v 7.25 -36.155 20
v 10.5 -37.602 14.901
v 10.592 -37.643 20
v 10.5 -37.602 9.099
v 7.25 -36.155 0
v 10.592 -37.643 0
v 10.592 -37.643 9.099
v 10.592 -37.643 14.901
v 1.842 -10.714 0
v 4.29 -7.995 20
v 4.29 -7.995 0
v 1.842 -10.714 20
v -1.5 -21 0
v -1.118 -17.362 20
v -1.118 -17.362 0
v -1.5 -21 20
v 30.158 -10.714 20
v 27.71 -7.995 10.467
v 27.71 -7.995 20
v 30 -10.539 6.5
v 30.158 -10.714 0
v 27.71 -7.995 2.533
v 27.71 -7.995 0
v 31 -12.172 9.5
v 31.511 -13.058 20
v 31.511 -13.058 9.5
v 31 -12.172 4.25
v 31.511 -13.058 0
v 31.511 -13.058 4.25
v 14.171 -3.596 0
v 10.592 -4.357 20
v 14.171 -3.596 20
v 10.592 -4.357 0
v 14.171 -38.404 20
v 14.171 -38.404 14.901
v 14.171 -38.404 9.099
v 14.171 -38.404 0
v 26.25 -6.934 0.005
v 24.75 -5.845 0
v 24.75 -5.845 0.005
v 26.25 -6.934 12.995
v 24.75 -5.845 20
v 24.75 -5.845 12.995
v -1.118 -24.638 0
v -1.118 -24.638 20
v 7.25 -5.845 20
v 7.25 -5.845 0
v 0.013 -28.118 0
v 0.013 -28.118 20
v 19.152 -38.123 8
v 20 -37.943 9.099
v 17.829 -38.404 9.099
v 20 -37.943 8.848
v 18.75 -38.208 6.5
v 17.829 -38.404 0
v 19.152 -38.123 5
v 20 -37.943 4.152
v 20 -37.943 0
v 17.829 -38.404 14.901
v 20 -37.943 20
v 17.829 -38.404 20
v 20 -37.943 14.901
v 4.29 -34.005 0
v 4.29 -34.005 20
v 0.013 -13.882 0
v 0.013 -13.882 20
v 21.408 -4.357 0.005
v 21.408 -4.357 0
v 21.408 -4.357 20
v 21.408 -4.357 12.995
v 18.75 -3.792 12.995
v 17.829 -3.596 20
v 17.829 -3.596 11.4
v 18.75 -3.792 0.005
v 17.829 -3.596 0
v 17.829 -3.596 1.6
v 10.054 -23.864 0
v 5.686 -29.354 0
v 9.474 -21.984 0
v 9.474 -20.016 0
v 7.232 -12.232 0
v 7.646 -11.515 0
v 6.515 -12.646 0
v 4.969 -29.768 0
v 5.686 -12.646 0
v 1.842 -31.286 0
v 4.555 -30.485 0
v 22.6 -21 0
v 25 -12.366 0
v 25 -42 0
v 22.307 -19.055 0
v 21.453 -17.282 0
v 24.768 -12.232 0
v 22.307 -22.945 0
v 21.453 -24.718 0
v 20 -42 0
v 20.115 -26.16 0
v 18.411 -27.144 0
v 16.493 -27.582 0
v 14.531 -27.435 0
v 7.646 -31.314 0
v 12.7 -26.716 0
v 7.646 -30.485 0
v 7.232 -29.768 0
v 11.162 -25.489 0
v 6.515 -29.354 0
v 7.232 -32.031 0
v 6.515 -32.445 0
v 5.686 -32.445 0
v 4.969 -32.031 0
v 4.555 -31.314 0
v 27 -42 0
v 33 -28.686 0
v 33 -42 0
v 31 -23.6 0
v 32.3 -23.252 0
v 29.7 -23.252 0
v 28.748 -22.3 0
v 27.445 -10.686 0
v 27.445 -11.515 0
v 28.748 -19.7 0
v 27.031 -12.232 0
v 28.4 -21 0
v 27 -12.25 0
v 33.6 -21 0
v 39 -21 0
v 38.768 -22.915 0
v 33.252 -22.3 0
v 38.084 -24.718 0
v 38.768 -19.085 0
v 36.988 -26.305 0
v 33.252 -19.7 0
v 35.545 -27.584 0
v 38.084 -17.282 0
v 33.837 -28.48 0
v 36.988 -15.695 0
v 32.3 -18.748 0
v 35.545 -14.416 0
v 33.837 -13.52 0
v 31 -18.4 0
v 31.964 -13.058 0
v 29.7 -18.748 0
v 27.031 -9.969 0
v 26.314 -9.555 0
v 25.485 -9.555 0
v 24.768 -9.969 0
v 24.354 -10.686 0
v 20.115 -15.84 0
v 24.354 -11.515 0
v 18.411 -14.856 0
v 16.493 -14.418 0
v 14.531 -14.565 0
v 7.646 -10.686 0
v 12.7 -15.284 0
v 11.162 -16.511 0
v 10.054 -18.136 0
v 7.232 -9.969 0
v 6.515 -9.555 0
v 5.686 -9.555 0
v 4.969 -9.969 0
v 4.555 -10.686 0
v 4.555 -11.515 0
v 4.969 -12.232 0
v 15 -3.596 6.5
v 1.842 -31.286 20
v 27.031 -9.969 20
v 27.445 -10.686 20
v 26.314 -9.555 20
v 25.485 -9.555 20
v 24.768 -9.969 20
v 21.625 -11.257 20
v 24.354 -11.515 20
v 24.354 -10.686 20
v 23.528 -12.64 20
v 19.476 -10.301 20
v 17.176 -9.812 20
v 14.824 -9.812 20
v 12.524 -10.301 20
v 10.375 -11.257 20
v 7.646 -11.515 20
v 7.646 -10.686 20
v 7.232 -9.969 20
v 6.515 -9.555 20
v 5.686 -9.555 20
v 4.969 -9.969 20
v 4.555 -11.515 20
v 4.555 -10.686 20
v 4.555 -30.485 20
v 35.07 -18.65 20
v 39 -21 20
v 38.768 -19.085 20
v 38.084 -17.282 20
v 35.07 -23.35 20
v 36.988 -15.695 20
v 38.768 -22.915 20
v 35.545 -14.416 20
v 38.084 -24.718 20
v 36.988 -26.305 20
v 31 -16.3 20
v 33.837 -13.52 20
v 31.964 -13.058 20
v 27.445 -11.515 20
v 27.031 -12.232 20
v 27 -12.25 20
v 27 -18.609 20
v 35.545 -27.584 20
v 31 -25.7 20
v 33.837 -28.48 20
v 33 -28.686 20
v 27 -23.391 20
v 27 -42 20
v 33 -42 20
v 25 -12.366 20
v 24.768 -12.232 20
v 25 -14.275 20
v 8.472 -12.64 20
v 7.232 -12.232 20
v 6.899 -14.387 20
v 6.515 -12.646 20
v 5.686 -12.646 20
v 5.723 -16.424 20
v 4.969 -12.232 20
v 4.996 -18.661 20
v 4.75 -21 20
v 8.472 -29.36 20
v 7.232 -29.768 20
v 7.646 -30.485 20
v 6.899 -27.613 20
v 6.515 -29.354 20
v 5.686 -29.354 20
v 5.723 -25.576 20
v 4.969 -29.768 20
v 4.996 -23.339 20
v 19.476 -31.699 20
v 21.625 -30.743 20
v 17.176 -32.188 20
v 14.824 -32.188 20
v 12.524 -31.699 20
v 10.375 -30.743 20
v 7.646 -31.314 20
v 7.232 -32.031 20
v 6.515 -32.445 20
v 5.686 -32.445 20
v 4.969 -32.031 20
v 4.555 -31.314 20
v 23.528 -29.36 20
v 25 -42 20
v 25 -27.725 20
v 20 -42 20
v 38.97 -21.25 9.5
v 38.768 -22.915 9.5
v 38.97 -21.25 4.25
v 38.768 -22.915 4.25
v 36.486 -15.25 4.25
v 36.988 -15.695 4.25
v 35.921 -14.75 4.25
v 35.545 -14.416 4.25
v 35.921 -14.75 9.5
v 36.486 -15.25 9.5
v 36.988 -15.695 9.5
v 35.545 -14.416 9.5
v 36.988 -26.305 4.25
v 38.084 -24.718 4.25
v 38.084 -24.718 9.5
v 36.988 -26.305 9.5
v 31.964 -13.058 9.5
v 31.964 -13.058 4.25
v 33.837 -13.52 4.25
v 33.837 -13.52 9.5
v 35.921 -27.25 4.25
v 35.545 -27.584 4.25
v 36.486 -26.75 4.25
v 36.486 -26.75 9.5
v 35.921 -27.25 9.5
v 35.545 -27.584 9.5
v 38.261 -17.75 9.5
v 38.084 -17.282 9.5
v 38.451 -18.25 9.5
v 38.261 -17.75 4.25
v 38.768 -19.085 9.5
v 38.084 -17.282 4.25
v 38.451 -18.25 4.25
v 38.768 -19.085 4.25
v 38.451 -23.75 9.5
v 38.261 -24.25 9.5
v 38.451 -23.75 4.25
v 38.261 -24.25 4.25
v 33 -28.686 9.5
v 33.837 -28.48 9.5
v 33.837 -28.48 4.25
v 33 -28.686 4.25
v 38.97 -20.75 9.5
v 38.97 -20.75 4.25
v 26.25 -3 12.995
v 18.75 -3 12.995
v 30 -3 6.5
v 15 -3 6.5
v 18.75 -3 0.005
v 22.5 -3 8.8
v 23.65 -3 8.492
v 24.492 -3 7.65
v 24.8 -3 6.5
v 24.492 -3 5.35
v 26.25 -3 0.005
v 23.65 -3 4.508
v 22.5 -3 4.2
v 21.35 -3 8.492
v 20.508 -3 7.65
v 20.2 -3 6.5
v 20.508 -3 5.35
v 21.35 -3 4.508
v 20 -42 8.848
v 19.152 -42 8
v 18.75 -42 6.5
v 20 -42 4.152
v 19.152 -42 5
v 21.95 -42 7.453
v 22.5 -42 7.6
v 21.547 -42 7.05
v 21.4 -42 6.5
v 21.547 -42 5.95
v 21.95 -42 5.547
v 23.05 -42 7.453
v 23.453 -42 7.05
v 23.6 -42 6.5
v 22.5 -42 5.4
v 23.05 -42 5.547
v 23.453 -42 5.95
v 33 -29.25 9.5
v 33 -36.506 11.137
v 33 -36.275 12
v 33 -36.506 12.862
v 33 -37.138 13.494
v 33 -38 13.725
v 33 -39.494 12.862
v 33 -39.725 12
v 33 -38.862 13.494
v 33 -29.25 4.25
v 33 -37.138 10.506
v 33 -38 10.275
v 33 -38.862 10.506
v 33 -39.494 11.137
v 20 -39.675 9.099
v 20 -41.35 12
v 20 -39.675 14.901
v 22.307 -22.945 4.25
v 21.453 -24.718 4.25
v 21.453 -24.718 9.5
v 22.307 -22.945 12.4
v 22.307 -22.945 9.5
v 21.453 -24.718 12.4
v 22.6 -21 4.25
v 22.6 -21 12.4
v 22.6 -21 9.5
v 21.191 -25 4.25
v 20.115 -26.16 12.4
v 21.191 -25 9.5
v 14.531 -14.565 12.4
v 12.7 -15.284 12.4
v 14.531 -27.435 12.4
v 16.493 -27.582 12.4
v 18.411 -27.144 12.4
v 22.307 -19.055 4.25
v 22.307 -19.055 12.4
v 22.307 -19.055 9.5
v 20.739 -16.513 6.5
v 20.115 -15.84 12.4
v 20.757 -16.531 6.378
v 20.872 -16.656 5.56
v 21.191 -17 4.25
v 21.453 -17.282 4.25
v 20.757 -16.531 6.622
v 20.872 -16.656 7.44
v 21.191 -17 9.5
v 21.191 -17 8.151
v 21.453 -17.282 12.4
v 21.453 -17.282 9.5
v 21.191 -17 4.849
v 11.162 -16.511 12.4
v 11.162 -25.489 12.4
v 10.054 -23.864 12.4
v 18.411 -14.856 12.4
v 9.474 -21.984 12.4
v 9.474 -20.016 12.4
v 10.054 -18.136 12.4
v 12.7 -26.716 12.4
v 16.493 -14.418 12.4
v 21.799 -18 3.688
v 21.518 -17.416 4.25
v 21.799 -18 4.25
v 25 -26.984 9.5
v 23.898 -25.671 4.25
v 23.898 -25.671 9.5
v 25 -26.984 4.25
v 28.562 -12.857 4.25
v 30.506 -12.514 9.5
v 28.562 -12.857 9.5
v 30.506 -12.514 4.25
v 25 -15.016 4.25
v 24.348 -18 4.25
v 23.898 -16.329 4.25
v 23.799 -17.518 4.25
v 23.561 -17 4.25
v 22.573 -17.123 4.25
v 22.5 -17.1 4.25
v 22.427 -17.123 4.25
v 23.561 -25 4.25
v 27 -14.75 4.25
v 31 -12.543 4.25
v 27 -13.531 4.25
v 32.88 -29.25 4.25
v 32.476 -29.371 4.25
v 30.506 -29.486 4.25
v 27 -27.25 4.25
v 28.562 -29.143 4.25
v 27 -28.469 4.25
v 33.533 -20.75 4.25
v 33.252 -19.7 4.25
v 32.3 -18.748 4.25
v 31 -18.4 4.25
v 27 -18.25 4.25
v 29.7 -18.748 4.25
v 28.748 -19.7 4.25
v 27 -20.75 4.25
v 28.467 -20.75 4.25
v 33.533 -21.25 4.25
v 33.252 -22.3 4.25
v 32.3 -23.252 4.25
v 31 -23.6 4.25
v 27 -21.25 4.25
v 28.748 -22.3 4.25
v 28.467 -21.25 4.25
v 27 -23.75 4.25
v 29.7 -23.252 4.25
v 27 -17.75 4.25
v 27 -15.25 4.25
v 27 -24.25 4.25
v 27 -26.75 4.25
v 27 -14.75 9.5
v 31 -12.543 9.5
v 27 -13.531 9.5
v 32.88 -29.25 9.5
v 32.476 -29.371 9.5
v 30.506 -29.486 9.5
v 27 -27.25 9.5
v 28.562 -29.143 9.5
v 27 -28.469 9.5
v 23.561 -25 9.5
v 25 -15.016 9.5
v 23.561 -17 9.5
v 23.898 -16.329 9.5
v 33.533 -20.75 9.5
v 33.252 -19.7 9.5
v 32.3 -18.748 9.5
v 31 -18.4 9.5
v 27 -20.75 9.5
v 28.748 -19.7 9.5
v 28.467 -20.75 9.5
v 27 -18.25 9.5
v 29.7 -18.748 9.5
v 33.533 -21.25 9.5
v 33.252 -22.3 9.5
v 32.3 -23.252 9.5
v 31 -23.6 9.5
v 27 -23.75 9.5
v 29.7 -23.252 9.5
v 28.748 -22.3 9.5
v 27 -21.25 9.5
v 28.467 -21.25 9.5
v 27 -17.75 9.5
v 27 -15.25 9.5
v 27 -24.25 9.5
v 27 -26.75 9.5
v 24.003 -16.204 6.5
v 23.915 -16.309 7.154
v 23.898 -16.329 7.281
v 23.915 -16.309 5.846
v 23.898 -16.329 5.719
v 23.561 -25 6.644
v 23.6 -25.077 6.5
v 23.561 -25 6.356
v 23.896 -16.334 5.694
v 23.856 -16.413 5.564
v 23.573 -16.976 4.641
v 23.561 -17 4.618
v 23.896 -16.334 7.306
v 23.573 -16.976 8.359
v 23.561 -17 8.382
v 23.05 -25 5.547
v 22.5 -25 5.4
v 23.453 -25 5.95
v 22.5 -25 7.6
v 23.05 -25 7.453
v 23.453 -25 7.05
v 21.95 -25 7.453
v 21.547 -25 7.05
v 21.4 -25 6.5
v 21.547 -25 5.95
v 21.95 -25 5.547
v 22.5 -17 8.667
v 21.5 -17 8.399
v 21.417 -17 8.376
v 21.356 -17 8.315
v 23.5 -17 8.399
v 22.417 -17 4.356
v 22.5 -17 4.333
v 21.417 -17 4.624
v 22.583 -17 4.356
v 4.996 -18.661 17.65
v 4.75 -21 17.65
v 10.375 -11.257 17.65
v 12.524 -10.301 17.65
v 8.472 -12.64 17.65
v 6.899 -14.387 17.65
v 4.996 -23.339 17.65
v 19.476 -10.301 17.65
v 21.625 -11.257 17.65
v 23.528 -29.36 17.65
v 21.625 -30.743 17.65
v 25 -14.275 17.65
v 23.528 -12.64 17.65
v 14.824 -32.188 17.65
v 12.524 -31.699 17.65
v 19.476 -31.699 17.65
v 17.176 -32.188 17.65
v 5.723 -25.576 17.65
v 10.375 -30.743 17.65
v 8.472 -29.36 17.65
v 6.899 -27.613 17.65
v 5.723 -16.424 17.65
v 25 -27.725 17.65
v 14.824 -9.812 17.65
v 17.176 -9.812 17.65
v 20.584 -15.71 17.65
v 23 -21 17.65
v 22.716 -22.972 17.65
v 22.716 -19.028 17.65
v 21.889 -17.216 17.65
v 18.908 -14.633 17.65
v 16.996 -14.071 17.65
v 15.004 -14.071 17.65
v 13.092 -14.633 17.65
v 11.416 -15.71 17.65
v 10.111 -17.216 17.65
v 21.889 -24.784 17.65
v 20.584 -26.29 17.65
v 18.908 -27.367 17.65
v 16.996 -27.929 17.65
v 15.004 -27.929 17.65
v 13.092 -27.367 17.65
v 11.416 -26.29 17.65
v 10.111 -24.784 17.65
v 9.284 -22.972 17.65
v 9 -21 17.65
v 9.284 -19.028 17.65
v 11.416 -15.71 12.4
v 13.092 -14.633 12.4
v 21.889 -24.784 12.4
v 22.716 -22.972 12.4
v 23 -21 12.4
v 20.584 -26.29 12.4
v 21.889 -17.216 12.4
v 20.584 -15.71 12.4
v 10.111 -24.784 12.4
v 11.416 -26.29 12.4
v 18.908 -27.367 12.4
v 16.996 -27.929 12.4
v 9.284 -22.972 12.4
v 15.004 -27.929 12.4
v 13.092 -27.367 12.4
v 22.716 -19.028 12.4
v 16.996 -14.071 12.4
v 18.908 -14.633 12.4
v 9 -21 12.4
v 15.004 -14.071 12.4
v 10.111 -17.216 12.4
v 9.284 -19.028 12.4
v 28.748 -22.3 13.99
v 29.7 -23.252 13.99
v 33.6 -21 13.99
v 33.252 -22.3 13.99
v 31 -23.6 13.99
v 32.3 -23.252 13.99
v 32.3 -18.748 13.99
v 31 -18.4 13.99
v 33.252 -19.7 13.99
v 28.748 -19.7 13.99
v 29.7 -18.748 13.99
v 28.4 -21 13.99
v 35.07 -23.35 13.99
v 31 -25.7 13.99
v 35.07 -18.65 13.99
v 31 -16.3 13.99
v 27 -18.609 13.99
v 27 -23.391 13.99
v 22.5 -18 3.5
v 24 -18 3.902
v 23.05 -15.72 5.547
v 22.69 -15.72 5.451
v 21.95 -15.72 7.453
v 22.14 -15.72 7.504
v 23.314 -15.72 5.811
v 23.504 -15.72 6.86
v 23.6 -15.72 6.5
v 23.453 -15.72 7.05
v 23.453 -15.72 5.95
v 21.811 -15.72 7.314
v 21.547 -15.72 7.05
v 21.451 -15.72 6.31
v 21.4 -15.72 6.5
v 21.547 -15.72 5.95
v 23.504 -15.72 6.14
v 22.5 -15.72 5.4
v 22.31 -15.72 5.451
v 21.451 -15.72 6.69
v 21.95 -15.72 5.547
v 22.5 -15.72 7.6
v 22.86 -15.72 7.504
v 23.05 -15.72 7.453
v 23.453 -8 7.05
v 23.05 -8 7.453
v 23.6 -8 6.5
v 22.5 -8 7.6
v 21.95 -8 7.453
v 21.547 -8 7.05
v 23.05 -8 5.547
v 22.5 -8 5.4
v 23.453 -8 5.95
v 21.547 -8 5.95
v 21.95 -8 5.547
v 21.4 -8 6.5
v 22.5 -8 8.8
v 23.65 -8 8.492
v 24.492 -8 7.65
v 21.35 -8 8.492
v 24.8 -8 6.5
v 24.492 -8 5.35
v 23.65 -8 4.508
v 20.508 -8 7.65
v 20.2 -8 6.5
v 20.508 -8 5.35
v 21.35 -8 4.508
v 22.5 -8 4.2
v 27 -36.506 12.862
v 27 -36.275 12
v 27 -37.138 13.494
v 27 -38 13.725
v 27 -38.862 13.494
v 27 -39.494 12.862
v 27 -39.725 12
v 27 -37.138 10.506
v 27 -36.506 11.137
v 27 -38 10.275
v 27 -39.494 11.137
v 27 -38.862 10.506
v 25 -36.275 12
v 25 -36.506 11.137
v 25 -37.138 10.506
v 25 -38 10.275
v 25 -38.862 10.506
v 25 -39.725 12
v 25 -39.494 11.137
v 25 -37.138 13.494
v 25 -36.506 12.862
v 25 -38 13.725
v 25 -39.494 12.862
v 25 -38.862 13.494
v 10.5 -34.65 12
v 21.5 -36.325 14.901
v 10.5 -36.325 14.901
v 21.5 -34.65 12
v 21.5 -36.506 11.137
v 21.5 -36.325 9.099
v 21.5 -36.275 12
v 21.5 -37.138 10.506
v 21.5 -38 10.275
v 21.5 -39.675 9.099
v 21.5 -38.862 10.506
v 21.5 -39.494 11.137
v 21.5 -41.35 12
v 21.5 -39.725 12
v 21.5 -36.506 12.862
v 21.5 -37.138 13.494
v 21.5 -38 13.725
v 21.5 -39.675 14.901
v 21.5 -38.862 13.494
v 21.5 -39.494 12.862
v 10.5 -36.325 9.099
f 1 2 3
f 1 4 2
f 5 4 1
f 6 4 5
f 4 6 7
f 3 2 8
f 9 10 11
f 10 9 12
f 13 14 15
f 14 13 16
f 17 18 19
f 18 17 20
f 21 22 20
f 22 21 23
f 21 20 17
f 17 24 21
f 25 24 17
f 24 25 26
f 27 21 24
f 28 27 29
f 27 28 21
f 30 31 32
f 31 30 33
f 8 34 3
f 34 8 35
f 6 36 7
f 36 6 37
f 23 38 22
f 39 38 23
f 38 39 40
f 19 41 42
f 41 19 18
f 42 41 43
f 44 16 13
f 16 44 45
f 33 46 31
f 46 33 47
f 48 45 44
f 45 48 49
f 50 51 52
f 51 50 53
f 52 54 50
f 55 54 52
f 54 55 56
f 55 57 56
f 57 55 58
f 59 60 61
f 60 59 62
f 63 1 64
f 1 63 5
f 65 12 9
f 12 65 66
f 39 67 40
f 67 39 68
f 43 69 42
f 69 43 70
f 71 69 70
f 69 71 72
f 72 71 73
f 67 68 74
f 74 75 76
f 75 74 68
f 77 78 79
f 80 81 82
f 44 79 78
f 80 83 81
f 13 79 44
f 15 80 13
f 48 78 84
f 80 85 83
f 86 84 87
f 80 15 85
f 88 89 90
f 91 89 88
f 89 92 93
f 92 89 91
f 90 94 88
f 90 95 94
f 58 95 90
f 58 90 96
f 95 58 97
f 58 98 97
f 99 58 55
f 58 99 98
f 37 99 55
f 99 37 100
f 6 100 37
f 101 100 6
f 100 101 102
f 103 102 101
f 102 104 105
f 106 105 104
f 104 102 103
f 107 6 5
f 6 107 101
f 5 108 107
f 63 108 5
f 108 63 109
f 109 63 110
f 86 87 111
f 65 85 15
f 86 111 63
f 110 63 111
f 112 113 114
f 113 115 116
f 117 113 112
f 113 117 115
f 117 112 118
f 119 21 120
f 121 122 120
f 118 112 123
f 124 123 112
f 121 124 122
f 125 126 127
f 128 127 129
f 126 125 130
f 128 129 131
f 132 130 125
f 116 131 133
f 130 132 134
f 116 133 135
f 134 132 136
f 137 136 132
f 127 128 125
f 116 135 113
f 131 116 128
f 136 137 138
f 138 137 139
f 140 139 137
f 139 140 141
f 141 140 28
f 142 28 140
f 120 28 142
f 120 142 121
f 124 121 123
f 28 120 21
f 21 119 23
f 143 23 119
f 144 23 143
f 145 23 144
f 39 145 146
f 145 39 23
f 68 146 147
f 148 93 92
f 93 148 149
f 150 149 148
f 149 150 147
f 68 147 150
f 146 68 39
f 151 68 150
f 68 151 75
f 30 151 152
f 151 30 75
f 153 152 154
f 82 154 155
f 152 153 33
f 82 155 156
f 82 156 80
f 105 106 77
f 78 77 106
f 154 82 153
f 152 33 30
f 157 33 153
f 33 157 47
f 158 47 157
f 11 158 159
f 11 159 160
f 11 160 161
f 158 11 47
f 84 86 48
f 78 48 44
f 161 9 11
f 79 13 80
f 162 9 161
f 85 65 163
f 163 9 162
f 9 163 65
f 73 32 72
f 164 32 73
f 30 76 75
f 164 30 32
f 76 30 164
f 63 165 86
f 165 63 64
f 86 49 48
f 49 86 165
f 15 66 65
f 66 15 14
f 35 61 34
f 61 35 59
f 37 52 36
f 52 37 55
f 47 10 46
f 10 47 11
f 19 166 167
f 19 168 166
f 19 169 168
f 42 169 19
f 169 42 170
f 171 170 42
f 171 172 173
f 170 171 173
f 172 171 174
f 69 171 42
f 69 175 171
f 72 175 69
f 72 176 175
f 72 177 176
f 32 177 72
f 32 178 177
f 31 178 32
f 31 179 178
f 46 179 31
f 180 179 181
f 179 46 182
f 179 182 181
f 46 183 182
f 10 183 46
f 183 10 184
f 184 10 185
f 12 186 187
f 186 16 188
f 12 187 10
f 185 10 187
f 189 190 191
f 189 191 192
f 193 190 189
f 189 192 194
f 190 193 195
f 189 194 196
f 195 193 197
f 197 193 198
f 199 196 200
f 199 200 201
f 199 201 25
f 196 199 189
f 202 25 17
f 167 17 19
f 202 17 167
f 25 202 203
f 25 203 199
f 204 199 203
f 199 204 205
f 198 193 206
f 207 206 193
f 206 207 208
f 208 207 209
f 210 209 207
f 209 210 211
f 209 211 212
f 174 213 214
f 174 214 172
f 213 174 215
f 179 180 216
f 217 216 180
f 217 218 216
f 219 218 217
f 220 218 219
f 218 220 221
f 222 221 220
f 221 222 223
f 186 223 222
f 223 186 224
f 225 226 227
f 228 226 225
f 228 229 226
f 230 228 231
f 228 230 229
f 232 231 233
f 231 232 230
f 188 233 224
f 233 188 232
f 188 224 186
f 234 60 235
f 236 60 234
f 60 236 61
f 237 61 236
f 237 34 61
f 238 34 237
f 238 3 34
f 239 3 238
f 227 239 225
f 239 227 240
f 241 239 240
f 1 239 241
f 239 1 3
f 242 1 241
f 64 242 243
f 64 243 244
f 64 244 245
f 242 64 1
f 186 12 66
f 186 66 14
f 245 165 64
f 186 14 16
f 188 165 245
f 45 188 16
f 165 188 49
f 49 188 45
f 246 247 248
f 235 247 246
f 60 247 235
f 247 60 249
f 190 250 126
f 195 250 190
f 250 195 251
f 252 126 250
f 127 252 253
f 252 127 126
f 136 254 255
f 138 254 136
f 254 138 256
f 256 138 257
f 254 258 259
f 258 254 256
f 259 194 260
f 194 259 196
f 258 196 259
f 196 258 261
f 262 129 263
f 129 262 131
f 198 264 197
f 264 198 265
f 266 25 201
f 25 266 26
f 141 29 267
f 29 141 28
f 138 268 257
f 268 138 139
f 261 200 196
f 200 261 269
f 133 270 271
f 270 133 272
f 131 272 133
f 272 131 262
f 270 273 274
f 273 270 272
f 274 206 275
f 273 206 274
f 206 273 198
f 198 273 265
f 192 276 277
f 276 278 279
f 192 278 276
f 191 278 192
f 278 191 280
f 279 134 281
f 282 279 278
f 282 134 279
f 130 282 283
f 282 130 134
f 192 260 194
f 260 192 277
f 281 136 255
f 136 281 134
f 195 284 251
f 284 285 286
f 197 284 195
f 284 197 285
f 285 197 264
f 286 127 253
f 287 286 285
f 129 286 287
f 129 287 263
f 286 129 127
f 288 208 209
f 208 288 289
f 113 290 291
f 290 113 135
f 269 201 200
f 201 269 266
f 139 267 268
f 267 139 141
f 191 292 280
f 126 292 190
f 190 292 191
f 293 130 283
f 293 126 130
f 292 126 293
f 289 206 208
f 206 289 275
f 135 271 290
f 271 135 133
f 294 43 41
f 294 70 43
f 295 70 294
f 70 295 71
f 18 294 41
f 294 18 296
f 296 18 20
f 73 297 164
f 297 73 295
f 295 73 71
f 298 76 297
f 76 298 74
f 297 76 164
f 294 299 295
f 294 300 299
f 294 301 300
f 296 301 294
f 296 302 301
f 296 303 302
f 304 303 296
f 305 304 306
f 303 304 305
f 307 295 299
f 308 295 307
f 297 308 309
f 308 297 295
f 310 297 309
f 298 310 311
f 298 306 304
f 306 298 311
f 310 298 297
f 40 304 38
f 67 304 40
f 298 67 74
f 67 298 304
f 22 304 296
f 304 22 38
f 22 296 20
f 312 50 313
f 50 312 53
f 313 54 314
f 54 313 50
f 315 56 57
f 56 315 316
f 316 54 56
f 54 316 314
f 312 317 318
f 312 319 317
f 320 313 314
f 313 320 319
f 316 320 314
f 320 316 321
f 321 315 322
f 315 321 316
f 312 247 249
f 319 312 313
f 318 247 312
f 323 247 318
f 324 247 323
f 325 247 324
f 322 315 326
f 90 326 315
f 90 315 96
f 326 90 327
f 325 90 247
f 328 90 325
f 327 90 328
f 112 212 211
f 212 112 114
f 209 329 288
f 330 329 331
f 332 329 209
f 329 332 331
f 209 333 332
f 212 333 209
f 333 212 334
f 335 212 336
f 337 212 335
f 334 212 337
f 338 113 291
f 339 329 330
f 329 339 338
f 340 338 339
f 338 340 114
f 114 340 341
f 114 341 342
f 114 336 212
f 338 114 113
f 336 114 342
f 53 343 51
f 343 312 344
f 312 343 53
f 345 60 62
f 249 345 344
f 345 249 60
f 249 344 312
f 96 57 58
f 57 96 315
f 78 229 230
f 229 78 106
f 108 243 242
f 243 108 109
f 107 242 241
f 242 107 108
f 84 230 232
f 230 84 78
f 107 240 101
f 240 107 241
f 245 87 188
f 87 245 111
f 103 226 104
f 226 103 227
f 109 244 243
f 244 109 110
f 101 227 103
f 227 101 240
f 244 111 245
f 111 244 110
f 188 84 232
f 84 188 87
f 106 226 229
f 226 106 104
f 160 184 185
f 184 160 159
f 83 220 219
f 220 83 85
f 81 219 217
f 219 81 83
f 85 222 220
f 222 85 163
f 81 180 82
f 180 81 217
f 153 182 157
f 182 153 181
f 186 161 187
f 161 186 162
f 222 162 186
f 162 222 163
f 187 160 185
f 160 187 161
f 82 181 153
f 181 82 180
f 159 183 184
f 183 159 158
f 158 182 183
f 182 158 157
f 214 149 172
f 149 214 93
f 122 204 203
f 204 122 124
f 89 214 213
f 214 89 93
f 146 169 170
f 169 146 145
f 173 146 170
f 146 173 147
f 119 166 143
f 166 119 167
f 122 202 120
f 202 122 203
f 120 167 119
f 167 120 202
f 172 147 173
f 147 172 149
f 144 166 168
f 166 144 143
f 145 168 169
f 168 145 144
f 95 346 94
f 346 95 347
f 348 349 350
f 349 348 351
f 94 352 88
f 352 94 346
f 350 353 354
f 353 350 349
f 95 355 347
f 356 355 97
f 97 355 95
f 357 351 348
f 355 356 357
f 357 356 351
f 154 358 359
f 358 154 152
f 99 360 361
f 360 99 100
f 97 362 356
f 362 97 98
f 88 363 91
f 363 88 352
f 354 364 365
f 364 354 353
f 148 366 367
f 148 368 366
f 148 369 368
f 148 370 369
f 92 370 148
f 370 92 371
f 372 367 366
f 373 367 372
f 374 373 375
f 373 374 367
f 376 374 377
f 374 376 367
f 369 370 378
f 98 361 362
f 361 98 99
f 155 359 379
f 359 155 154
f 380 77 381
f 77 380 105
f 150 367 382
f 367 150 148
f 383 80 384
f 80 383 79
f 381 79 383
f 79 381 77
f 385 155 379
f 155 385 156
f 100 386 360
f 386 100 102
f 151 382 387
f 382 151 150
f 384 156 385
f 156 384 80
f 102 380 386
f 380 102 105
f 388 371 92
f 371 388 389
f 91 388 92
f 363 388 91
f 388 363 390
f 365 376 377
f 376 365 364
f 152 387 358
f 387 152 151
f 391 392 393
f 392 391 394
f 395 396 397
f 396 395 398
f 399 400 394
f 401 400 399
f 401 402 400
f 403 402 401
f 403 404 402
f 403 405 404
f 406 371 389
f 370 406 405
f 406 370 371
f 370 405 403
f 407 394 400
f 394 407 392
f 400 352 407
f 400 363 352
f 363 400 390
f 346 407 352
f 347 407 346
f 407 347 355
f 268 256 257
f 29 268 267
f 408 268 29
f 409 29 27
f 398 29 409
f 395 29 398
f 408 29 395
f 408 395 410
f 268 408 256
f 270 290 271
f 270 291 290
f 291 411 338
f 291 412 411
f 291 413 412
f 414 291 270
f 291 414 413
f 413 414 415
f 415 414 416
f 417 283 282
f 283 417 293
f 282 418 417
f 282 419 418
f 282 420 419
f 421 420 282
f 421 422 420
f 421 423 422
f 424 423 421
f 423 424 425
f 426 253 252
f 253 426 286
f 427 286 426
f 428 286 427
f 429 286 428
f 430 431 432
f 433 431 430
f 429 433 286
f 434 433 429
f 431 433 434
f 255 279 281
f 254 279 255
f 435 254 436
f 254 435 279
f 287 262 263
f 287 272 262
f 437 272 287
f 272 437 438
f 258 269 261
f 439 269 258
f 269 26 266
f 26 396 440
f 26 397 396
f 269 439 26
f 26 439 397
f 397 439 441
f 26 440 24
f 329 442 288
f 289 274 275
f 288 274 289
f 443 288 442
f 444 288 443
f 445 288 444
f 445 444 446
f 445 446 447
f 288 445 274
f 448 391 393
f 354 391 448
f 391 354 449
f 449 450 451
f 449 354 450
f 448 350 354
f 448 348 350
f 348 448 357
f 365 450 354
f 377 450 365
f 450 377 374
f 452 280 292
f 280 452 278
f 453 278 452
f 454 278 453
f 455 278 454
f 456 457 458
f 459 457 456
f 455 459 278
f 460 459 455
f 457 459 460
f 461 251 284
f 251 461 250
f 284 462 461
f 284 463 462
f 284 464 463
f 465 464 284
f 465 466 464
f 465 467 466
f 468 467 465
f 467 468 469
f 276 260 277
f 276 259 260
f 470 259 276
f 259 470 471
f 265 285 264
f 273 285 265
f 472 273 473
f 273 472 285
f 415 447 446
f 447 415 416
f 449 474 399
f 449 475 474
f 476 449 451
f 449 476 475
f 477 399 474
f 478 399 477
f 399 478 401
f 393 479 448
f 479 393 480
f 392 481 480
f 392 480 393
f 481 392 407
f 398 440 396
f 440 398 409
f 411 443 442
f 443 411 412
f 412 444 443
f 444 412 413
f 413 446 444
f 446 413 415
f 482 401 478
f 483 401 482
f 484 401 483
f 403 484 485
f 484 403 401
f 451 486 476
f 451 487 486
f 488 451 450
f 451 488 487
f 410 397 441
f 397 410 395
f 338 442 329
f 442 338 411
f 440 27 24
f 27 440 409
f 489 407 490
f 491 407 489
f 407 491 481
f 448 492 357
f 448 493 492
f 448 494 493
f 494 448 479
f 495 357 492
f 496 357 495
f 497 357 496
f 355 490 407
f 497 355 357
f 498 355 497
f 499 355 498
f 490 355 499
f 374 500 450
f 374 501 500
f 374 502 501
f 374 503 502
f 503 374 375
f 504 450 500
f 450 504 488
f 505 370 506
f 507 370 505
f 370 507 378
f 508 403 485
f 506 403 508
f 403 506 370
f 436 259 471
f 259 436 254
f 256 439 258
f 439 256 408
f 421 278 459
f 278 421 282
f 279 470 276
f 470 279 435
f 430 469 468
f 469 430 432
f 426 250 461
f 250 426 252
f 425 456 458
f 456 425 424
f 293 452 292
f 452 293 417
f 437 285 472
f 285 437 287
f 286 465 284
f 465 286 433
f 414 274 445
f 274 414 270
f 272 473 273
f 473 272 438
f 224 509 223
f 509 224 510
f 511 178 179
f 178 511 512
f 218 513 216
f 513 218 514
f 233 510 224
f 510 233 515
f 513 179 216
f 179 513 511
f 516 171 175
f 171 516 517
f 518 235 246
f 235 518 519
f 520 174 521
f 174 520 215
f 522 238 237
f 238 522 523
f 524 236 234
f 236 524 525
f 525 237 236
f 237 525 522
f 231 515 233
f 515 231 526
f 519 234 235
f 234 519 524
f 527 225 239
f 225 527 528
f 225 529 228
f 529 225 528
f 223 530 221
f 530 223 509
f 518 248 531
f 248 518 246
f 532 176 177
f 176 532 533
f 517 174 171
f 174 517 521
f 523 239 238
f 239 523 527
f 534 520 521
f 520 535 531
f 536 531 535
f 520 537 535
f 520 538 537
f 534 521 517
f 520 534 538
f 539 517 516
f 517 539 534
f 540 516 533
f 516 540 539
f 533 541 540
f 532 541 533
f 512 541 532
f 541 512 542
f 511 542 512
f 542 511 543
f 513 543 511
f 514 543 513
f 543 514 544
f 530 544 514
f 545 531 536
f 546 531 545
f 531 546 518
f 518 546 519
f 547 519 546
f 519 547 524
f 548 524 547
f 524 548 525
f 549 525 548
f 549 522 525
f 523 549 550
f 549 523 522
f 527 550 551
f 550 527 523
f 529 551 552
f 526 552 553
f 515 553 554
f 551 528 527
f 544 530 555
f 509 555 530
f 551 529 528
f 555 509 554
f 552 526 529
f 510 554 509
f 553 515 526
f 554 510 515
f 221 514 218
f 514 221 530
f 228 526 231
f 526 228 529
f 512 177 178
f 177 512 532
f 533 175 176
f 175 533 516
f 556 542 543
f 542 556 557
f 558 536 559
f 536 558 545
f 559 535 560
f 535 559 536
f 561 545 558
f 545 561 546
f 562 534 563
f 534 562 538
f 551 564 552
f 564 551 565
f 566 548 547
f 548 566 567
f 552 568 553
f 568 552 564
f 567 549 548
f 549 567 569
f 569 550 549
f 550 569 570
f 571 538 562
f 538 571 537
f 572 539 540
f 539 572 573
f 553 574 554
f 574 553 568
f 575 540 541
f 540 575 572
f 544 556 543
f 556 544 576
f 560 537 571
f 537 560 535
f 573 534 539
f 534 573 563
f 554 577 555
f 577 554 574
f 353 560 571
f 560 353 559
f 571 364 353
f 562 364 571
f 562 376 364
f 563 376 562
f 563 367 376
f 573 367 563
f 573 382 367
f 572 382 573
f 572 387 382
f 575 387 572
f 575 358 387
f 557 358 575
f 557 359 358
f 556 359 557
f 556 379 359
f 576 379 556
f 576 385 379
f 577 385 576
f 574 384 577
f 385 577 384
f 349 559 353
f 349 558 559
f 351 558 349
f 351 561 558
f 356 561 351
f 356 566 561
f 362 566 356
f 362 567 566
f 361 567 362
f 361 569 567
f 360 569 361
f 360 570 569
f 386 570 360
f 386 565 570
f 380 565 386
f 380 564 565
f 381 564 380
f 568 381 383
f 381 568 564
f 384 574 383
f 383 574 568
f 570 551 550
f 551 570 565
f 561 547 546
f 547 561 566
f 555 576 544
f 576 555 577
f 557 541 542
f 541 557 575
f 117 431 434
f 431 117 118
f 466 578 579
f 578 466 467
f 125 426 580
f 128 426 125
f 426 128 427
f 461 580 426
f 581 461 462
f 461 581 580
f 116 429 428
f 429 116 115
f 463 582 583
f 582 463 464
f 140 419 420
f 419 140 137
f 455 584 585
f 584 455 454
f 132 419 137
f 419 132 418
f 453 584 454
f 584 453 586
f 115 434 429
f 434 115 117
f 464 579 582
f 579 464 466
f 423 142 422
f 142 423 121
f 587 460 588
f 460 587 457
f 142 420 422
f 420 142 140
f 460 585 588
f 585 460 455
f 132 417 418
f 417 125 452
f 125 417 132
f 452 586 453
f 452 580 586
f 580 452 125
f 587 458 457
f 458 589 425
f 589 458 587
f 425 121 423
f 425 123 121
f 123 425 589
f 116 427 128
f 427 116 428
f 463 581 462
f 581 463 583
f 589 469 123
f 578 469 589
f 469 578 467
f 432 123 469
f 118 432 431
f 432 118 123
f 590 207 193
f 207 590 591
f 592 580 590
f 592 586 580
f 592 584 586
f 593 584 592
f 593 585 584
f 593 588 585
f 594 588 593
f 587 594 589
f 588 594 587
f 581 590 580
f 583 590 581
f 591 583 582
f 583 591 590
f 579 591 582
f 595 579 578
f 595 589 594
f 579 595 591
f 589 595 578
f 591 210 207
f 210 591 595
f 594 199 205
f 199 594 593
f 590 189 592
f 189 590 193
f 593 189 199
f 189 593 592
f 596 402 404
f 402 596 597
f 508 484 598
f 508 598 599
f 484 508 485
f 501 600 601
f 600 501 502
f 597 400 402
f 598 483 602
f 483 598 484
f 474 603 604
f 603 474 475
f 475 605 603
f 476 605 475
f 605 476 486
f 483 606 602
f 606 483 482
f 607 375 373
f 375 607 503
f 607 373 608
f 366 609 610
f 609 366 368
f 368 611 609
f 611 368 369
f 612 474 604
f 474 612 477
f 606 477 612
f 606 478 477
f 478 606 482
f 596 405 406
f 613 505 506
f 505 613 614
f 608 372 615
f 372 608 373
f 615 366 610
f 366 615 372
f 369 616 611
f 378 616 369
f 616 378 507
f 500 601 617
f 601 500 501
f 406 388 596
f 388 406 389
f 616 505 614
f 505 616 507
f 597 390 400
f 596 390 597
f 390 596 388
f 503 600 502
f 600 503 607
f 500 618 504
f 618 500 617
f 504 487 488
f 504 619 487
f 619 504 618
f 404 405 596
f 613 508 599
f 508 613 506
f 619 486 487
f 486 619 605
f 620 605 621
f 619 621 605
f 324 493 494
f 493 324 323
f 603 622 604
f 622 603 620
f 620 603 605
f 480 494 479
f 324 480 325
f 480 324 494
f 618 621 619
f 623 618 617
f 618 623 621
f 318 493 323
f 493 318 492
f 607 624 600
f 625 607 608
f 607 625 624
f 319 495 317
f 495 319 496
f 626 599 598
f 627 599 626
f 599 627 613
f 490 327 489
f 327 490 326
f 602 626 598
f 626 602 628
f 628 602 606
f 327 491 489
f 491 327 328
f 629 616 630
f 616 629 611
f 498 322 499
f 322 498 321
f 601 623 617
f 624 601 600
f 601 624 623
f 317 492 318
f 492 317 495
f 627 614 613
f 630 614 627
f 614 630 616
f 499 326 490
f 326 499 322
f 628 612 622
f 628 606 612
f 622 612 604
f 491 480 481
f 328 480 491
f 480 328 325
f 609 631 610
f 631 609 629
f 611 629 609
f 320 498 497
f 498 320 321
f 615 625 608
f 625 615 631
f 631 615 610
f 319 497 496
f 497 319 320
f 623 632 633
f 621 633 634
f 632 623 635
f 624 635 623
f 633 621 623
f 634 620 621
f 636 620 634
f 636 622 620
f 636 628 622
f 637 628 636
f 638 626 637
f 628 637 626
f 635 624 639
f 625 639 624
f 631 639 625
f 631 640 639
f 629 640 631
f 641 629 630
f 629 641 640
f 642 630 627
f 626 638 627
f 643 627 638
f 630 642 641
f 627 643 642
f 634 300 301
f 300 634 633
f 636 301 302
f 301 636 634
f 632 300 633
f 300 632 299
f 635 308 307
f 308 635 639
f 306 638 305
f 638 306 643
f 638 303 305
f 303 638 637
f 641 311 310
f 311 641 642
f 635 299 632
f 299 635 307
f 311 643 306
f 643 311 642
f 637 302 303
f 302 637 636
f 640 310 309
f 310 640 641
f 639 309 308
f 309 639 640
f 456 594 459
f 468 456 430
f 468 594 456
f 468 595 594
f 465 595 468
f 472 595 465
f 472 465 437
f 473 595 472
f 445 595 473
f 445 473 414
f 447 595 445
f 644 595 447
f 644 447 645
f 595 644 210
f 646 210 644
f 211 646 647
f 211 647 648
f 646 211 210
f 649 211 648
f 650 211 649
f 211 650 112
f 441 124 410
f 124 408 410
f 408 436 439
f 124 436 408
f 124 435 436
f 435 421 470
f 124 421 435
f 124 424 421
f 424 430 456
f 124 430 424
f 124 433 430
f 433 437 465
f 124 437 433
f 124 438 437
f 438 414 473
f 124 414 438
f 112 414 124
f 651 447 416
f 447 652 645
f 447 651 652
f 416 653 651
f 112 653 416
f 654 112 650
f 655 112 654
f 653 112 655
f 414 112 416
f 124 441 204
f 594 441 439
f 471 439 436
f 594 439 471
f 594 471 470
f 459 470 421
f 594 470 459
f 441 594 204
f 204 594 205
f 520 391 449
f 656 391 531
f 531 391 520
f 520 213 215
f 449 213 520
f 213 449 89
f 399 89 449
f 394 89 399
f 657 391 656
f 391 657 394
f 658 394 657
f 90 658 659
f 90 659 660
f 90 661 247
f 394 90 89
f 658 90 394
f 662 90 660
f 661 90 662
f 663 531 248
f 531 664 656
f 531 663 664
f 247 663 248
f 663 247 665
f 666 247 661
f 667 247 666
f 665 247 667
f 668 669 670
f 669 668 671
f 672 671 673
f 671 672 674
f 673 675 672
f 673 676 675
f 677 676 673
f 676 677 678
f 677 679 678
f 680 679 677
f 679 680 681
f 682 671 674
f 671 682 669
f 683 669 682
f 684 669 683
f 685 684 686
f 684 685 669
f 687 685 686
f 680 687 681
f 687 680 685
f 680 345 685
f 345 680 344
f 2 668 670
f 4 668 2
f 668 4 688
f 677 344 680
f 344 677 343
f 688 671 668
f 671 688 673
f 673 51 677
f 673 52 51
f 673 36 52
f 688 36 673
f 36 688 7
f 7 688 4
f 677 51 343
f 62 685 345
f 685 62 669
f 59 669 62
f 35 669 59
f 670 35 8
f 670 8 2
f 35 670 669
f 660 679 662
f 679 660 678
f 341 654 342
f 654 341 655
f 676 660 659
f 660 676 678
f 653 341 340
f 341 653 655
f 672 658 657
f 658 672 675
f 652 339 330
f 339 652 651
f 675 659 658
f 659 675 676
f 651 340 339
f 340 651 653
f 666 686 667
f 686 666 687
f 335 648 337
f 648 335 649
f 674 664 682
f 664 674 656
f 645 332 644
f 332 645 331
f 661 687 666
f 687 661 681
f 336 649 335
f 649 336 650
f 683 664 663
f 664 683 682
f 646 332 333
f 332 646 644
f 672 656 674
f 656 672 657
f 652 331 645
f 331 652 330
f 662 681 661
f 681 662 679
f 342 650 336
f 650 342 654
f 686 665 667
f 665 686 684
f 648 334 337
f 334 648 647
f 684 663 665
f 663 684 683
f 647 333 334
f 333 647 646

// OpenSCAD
// file: configuration.scad
// Increase this if your slicer or printer make holes too tight.
extra_radius = 0.1;

// OD = outside diameter, corner to corner.
m3_nut_od = 6.1;
m3_nut_radius = m3_nut_od/2 + 0.2 + extra_radius;
m3_washer_radius = 3.5 + extra_radius;

// Major diameter of metric 3mm thread.
m3_major = 2.85;
m3_radius = m3_major/2 + extra_radius;
m3_wide_radius = m3_major/2 + extra_radius + 0.2;

// NEMA17 stepper motors.
motor_shaft_diameter = 5;
motor_shaft_radius = motor_shaft_diameter/2 + extra_radius;

// Frame brackets. M3x8mm screws work best with 3.6 mm brackets.
thickness = 3.6;

// OpenBeam or Misumi. Currently only 15x15 mm, but there is a plan
// to make models more parametric and allow 20x20 mm in the future.
extrusion = 15;

// Placement for the NEMA17 stepper motors.
motor_offset = 44;
motor_length = 47;
// main file
// Based on "Makergear Filament drive goes Bowden" by Luke321
// http://www.thingiverse.com/thing:63674

include <configuration.scad>;

filament_offset = 22.5;

module extruder() {
  rotate([90, 0, 0]) difference() {
    union() {
      //main cylinder
      translate([16,20,21]) rotate([90,0,0]) cylinder(h=20, r=17.5);

      //bearing mount
      translate([31,20,21]) rotate([90,0,0]) cylinder (h=20, r=8);

      //pushfit/pneufit mount
      translate([filament_offset, 6.5, 13])
        cylinder(r=7.5, h=20, center=true, $fn=6);

      //filament support
      translate([21.75,6.5,34]) rotate([0,0,0]) cylinder (h=8, r=3, $fn=12);

      //clamp
      translate([20, 0, 28]) cube([13, 20, 14]);
    }

    //pulley opening
    translate([16,21,21]) rotate([90,0,0]){
      cylinder (h=22, r=6.6);

      rotate([0,0,45]) {
        //translate([14,0,0]) cylinder(h=22, r=1.6, $fn=12);
        translate([0,14,0]) cylinder(h=22, r=1.6, $fn=12);
        translate([-14,0,0]) cylinder(h=22, r=1.6, $fn=12);
        translate([0,-14,0]) cylinder(h=22, r=1.6, $fn=12);
      }
    }

    //gearhead indentation
    translate([16,21,21]) rotate([90,0,0]) cylinder (h=3.35, r=11.25);

    //pulley hub indentation
    translate([16,20-2,21]) rotate([90,0,0]) cylinder (h=5.6, r=7);

    //bearing screws
    translate([31,21,21]) rotate([90,0,0]) cylinder (h=22, r=2.6, $fn=12);
    #translate([31,22,21]) rotate([90,30,0]) cylinder (h=8.01, r=4.7, $fn=6);

    //bearing
    difference() {
      union() {
        translate([31,9.5,21]) rotate([90,0,0]) cylinder (h=5.25, r=8.5);
        translate([31,9.5-5.25,21-8.25-2]) cube([20, 5.25, 18.5]);
        //opening between bearing and pulley
        translate([20,9.5-5.25,21-8.25+3.25+1]) cube([10, 5.25, 8]);
      }
      //removable supports
      for (z = [15:3:27]) {
        translate([36, 10, z]) # cube([20, 20, 0.5], center=true);
      }
    }

    //filament path chamfer
    translate([filament_offset,6.5,15]) rotate([0,0,0]) #
      cylinder(h=3, r1=0.5, r2=3, $fn=12);

    //filament path
    translate([filament_offset,6.5,-10]) rotate([0,0,0]) #
      cylinder(h=60, r=1.1, $fn=12);

    //pushfit/pneufit mount
    translate([filament_offset, 6.5, 0]) # cylinder(r=2.3, h=8, $fn=12);

    //clamp slit
    translate([25,-1,10]) cube([2, 22, 35]);
    //clamp nut
    translate([10.5,12,38]) rotate([0,90,0])
      cylinder(h=11, r=m3_nut_radius, $fn=6);
    //clamp screw hole
    translate([15,12,38]) rotate([0,90,0])
      cylinder(h=20, r=m3_wide_radius, $fn=12);
  }
}

extruder();
